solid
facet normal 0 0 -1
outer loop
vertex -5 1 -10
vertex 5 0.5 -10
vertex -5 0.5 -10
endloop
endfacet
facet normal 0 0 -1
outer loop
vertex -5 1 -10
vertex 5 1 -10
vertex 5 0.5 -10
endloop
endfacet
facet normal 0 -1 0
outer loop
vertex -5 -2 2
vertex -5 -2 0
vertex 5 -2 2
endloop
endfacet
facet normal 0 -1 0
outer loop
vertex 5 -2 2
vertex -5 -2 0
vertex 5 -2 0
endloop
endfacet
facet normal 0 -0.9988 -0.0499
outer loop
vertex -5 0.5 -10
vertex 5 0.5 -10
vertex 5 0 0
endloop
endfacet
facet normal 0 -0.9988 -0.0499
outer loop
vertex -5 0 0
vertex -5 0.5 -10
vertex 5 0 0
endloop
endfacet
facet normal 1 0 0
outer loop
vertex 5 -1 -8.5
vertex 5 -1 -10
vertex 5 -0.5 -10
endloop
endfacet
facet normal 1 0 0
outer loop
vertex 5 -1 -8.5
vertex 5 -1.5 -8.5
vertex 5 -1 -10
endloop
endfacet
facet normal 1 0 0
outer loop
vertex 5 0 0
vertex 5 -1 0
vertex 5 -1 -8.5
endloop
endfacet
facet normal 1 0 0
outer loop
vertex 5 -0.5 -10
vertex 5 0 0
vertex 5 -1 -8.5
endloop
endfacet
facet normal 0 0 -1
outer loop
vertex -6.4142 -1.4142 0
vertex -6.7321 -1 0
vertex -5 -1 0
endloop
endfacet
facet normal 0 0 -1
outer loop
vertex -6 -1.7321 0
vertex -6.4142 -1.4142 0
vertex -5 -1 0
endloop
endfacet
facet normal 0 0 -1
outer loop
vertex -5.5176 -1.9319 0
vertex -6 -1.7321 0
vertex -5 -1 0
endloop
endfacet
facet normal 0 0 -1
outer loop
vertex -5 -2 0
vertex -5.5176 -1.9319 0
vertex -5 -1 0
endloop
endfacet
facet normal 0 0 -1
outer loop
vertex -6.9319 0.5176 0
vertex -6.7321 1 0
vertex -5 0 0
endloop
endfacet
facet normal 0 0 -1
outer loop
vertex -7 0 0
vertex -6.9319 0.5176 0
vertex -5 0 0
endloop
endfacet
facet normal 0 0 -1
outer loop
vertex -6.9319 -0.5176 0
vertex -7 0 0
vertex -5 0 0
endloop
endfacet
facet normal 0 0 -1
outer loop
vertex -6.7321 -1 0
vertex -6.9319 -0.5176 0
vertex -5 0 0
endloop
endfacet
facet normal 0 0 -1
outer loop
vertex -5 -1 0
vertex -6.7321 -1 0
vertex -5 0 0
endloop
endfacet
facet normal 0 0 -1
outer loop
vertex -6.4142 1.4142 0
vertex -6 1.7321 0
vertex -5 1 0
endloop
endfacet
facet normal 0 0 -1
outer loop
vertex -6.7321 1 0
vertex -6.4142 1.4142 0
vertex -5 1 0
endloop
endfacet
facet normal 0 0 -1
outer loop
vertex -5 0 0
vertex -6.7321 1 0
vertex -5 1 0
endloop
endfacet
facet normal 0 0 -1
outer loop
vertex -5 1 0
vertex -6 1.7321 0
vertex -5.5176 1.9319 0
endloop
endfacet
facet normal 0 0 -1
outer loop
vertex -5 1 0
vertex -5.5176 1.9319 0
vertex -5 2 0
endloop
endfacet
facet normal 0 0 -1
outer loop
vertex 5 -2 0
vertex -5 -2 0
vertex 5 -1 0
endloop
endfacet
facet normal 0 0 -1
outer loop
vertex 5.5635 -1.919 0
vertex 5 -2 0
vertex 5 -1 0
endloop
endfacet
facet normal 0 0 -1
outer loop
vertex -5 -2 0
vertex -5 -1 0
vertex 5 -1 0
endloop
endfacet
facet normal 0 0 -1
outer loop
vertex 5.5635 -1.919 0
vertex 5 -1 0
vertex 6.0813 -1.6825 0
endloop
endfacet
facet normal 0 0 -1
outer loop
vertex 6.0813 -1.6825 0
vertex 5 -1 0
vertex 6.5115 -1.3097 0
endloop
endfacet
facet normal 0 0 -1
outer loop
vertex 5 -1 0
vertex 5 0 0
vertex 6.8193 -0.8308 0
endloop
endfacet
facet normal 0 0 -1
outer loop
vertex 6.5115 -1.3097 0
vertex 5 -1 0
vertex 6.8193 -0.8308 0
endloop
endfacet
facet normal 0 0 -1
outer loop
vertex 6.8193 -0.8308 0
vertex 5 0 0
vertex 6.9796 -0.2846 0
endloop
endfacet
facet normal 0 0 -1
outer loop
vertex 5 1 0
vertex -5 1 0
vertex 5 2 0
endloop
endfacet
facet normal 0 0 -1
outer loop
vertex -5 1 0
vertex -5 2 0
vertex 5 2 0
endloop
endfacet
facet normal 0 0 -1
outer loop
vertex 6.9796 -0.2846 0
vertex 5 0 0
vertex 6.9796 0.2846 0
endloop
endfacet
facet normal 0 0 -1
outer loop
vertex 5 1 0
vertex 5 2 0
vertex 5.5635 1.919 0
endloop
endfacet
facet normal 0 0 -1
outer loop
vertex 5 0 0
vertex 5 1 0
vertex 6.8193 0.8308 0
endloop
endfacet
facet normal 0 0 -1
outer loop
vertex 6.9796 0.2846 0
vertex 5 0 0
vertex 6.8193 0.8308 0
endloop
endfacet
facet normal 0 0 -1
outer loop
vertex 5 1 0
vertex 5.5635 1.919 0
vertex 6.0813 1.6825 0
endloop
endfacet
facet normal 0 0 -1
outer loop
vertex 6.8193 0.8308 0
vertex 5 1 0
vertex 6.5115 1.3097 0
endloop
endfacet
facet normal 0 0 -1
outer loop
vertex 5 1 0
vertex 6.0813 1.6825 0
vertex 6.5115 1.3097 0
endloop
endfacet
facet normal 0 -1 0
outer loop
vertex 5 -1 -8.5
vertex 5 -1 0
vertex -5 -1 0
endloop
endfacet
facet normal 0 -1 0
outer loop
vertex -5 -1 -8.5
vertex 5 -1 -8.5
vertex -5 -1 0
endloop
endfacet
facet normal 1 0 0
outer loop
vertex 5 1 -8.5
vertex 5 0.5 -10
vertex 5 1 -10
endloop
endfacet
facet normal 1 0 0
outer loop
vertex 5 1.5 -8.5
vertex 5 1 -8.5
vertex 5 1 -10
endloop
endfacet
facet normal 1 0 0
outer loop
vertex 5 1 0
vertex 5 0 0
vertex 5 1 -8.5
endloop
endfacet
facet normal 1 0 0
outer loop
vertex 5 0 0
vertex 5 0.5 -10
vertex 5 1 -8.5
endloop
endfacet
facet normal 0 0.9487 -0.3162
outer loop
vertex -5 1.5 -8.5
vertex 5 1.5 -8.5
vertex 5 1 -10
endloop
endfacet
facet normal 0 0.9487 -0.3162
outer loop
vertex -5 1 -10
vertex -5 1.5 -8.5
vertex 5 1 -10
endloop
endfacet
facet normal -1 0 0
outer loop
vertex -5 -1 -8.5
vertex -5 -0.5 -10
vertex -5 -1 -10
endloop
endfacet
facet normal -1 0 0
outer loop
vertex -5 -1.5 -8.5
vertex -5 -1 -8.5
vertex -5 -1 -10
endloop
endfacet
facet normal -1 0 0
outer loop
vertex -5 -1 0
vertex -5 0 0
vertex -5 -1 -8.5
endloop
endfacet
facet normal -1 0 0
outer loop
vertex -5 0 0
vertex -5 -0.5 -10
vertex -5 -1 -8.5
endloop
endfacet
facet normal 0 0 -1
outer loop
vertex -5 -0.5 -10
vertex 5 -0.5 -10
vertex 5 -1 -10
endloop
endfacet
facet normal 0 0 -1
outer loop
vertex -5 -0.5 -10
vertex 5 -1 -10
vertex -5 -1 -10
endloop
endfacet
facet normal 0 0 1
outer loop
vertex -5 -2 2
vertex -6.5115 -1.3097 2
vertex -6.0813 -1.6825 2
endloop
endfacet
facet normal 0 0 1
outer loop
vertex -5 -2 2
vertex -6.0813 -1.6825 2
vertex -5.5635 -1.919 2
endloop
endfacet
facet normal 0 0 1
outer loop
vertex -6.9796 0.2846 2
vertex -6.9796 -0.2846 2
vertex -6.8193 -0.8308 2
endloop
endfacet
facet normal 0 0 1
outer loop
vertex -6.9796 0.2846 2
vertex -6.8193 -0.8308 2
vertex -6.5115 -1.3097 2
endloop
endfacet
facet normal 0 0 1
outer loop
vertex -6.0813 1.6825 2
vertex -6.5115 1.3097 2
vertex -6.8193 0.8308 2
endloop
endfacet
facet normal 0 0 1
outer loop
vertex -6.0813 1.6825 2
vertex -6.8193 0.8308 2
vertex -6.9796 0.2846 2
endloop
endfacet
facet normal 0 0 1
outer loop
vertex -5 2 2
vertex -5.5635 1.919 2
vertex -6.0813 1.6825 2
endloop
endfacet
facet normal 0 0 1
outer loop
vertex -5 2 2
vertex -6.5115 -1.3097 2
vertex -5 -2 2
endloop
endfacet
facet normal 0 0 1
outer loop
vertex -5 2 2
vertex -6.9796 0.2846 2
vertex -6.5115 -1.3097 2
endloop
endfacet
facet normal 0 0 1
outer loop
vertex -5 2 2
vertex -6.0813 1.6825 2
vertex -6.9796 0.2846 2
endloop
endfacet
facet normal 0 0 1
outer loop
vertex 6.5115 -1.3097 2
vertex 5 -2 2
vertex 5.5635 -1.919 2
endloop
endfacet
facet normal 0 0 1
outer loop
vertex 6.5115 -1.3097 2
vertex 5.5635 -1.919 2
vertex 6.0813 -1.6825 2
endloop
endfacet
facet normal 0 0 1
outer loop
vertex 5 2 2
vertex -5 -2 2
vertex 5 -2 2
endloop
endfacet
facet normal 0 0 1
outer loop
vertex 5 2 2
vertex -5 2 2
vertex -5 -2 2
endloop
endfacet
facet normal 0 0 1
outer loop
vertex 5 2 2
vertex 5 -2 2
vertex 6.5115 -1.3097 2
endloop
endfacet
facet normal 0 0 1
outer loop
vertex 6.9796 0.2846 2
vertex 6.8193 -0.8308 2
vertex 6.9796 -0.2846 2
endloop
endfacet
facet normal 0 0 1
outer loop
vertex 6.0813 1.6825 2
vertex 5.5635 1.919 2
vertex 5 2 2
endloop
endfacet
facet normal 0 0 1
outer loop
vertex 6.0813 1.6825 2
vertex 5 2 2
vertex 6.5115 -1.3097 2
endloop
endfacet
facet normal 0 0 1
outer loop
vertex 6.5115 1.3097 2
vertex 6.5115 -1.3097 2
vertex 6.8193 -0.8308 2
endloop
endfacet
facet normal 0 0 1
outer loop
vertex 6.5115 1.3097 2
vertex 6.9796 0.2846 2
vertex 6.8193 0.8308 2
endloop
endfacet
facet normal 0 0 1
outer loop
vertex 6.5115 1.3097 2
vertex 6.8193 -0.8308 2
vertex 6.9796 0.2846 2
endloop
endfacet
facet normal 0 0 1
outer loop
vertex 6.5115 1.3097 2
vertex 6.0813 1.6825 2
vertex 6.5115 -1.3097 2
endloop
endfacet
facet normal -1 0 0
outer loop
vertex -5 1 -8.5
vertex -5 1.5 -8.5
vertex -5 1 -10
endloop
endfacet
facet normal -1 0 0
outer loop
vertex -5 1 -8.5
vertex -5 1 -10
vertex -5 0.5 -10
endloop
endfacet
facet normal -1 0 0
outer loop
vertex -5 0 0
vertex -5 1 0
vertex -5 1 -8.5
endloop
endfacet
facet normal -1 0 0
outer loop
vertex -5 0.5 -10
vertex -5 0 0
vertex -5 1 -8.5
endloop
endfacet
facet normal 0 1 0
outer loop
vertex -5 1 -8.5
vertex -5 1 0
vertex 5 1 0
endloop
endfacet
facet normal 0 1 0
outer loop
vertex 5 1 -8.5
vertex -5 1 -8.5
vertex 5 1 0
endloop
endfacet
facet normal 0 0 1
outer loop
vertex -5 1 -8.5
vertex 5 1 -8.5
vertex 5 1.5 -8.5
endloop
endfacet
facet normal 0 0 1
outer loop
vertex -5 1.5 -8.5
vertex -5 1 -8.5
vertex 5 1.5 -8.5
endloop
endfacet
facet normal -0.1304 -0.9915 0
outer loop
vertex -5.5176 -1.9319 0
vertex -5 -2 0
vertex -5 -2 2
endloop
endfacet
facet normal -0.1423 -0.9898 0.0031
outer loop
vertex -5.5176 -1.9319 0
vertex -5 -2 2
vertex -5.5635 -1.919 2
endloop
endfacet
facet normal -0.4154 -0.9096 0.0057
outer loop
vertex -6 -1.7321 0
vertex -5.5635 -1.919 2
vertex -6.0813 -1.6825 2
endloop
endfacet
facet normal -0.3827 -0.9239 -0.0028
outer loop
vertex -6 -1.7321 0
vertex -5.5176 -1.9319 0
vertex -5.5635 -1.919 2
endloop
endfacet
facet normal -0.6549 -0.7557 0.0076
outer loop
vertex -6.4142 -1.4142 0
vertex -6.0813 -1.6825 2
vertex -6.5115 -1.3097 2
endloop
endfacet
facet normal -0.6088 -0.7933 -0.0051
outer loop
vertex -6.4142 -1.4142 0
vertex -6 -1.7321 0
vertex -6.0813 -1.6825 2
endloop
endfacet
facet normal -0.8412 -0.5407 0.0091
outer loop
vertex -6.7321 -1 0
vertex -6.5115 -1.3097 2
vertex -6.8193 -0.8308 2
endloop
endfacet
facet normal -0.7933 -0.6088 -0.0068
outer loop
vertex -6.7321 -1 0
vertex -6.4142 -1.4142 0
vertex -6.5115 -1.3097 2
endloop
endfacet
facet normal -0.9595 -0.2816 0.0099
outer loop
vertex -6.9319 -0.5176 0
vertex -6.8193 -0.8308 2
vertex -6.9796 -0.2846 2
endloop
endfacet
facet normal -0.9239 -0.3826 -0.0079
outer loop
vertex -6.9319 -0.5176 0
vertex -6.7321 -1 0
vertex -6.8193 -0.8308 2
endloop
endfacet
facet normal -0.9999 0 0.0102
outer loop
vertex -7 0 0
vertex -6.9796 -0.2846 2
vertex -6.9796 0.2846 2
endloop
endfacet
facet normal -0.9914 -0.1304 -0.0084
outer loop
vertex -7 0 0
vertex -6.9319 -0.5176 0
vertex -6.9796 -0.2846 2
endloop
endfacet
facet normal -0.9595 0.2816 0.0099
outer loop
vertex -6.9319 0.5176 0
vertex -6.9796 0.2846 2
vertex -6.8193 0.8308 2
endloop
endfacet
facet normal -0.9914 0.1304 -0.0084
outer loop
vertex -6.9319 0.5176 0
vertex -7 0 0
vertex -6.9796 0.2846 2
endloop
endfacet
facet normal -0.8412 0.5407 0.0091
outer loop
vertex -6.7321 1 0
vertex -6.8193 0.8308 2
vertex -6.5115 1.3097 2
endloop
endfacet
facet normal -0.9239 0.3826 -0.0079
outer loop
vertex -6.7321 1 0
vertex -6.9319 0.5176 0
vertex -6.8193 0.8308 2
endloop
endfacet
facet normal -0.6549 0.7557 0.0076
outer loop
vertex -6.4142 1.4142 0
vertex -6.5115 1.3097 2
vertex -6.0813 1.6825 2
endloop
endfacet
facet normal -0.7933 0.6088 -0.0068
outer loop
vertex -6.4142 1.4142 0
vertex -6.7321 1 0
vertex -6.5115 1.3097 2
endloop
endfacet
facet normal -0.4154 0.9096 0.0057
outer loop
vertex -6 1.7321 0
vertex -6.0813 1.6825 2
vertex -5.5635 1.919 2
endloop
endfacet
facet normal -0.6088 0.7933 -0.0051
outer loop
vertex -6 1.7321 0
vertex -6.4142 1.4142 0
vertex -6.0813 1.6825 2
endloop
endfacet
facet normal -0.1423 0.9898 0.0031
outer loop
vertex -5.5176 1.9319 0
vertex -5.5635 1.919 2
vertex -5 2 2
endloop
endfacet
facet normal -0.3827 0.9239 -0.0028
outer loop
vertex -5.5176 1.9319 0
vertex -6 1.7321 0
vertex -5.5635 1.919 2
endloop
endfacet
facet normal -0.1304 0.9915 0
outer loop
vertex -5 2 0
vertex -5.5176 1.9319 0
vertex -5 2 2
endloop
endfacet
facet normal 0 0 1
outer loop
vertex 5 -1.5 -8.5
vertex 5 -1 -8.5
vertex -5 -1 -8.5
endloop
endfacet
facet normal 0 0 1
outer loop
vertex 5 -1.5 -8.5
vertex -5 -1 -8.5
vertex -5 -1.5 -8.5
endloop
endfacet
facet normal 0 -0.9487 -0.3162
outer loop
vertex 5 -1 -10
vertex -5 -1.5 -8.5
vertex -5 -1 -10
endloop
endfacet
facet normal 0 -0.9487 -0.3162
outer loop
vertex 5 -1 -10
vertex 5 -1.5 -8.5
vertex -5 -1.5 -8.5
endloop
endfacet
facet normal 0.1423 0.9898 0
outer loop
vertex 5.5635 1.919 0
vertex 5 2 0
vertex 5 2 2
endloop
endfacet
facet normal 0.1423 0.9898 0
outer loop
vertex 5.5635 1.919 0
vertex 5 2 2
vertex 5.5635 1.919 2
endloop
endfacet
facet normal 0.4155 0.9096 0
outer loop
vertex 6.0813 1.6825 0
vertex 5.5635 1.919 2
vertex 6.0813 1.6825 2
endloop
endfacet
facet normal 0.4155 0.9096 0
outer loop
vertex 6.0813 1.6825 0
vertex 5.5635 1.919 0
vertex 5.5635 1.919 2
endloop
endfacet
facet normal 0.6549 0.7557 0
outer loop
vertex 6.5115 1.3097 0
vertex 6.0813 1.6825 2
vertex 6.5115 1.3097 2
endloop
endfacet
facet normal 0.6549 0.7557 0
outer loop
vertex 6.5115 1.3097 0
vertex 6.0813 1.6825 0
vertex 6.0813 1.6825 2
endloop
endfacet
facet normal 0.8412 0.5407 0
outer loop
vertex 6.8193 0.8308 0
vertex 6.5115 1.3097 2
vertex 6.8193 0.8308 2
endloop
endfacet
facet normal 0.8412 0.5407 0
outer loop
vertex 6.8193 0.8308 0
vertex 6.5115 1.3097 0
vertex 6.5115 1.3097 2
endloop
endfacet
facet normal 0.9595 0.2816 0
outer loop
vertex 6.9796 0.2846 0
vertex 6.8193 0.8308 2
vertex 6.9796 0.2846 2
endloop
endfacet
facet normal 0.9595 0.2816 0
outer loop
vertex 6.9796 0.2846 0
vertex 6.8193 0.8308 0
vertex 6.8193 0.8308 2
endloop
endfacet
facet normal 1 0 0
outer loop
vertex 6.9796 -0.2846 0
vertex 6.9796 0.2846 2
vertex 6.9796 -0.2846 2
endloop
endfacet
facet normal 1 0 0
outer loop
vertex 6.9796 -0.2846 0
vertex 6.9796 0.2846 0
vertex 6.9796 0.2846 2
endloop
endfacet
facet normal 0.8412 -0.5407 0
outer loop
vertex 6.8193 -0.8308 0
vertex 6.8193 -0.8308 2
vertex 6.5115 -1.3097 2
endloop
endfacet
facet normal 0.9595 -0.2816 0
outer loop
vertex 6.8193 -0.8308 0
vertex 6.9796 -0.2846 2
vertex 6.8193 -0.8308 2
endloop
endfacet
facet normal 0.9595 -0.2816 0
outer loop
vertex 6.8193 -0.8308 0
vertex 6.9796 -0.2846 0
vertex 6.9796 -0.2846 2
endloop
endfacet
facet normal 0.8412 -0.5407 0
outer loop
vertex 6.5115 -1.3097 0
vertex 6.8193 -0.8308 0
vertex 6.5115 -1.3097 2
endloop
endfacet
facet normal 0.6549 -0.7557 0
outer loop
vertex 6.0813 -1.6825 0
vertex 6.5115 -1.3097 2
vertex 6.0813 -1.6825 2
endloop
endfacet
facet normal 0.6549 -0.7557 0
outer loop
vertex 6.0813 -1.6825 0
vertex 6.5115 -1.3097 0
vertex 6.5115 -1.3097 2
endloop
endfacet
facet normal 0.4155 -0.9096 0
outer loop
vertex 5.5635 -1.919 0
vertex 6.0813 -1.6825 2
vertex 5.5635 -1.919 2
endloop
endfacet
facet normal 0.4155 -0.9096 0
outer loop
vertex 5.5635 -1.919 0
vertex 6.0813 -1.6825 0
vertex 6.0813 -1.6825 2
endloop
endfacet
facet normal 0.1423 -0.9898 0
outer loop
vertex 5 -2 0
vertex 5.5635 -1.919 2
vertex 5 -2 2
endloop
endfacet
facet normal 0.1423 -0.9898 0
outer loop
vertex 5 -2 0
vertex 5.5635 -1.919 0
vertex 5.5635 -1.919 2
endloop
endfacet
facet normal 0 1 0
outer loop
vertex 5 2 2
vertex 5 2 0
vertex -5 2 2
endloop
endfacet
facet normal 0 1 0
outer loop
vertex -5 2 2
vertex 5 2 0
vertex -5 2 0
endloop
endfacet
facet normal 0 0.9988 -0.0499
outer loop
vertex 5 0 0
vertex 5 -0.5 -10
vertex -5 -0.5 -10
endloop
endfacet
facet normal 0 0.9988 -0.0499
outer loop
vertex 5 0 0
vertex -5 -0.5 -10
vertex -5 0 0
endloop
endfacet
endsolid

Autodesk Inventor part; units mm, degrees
ref_plane "YZ Plane" through (0, 0, 0) normal (1, 0, 0) x (0, 1, 0)
ref_plane "XZ Plane" through (0, 0, 0) normal (0, 1, 0) x (-1, 0, 0)
ref_plane "XY Plane" through (0, 0, 0) normal (0, 0, 1) x (1, 0, 0)
sketch "Sketch1" plane through (0, 0, 0) normal (0, 0, 1) x (1, 0, 0)
  line L0 (-5, 0) -> (5, 0) construction
  line L1 (-5, -1) -> (5, -1)
  line L2 (5, 1) -> (-5, 1)
  arc A0 (-5, 1) -> (-5, -1) centre (-5, 0) ccw
  arc A1 (5, -1) -> (5, 1) centre (5, 0) ccw
  line L3 (-5, 0) -> (5, 0) construction
  line L4 (-5, -2) -> (5, -2)
  line L5 (5, 2) -> (-5, 2)
  arc A2 (-5, 2) -> (-5, -2) centre (-5, 0) ccw
  arc A3 (5, -2) -> (5, 2) centre (5, 0) ccw
  point P0 (0, 0)
extrude "Extrusion1" add sketch "Sketch1" along normal blind 2 contours A0 L2 A1 L1 | A2 L5 A3 L4
sketch "Sketch2" plane through (0, 0, 0) normal (0, 0, -1) x (-1, 0, 0)
  arc A0 (5, -2) -> (5, 2) centre (5, 0) ccw projected
  line L0 (-5, 0) -> (5, 0) construction
  line L1 (-5, -1) -> (5, -1)
  line L2 (5, 1) -> (-5, 1)
  arc A1 (-5, 1) -> (-5, -1) centre (-5, 0) ccw
  arc A2 (5, -1) -> (5, 1) centre (5, 0) ccw
  line L3 (5, 1) -> (5, -1)
  line L4 (-5, -1) -> (-5, 1)
  point P0 (0, 0)
extrude "Extrusion2" add sketch "Sketch2" along normal blind 10 contours L4 L2 L3 L1
sketch "Sketch3" plane through (5, -1, 0) normal (1, 0, 0) x (0, 0, -1)
  line L0 (0, 2) -> (10, 2) projected
  line L1 (10, 2) -> (8.5, 2)
  line L2 (8.5, 2) -> (8.5, 2.5)
  line L3 (8.5, 2.5) -> (10, 2)
  line L4 (0, 0) -> (10, 0) projected
  line L5 (10, 0) -> (8.5, 0)
  line L6 (8.5, 0) -> (8.5, -0.5)
  line L7 (8.5, -0.5) -> (10, 0)
  point P0 (0, 1)
  dimension "d8" = 1.5
  dimension "d9" = 0.5
  dimension "d10" = 0.5
extrude "Extrusion3" add sketch "Sketch3" against normal up to surface (10 mm away)
sketch "Sketch4" plane through (5, -1, 0) normal (1, 0, 0) x (0, 0, -1)
  line L0 (10, 0) -> (10, 2) projected
  line L1 (10, 1) -> (10, 1.5)
  line L2 (10, 1.5) -> (0, 1)
  line L3 (10, 1) -> (10, 0.5)
  line L4 (10, 0.5) -> (0, 1)
  dimension "d13" = 0.5
  dimension "d14" = 0.5
extrude "Extrusion4" cut sketch "Sketch4" against normal through all
properties part number "clip"
